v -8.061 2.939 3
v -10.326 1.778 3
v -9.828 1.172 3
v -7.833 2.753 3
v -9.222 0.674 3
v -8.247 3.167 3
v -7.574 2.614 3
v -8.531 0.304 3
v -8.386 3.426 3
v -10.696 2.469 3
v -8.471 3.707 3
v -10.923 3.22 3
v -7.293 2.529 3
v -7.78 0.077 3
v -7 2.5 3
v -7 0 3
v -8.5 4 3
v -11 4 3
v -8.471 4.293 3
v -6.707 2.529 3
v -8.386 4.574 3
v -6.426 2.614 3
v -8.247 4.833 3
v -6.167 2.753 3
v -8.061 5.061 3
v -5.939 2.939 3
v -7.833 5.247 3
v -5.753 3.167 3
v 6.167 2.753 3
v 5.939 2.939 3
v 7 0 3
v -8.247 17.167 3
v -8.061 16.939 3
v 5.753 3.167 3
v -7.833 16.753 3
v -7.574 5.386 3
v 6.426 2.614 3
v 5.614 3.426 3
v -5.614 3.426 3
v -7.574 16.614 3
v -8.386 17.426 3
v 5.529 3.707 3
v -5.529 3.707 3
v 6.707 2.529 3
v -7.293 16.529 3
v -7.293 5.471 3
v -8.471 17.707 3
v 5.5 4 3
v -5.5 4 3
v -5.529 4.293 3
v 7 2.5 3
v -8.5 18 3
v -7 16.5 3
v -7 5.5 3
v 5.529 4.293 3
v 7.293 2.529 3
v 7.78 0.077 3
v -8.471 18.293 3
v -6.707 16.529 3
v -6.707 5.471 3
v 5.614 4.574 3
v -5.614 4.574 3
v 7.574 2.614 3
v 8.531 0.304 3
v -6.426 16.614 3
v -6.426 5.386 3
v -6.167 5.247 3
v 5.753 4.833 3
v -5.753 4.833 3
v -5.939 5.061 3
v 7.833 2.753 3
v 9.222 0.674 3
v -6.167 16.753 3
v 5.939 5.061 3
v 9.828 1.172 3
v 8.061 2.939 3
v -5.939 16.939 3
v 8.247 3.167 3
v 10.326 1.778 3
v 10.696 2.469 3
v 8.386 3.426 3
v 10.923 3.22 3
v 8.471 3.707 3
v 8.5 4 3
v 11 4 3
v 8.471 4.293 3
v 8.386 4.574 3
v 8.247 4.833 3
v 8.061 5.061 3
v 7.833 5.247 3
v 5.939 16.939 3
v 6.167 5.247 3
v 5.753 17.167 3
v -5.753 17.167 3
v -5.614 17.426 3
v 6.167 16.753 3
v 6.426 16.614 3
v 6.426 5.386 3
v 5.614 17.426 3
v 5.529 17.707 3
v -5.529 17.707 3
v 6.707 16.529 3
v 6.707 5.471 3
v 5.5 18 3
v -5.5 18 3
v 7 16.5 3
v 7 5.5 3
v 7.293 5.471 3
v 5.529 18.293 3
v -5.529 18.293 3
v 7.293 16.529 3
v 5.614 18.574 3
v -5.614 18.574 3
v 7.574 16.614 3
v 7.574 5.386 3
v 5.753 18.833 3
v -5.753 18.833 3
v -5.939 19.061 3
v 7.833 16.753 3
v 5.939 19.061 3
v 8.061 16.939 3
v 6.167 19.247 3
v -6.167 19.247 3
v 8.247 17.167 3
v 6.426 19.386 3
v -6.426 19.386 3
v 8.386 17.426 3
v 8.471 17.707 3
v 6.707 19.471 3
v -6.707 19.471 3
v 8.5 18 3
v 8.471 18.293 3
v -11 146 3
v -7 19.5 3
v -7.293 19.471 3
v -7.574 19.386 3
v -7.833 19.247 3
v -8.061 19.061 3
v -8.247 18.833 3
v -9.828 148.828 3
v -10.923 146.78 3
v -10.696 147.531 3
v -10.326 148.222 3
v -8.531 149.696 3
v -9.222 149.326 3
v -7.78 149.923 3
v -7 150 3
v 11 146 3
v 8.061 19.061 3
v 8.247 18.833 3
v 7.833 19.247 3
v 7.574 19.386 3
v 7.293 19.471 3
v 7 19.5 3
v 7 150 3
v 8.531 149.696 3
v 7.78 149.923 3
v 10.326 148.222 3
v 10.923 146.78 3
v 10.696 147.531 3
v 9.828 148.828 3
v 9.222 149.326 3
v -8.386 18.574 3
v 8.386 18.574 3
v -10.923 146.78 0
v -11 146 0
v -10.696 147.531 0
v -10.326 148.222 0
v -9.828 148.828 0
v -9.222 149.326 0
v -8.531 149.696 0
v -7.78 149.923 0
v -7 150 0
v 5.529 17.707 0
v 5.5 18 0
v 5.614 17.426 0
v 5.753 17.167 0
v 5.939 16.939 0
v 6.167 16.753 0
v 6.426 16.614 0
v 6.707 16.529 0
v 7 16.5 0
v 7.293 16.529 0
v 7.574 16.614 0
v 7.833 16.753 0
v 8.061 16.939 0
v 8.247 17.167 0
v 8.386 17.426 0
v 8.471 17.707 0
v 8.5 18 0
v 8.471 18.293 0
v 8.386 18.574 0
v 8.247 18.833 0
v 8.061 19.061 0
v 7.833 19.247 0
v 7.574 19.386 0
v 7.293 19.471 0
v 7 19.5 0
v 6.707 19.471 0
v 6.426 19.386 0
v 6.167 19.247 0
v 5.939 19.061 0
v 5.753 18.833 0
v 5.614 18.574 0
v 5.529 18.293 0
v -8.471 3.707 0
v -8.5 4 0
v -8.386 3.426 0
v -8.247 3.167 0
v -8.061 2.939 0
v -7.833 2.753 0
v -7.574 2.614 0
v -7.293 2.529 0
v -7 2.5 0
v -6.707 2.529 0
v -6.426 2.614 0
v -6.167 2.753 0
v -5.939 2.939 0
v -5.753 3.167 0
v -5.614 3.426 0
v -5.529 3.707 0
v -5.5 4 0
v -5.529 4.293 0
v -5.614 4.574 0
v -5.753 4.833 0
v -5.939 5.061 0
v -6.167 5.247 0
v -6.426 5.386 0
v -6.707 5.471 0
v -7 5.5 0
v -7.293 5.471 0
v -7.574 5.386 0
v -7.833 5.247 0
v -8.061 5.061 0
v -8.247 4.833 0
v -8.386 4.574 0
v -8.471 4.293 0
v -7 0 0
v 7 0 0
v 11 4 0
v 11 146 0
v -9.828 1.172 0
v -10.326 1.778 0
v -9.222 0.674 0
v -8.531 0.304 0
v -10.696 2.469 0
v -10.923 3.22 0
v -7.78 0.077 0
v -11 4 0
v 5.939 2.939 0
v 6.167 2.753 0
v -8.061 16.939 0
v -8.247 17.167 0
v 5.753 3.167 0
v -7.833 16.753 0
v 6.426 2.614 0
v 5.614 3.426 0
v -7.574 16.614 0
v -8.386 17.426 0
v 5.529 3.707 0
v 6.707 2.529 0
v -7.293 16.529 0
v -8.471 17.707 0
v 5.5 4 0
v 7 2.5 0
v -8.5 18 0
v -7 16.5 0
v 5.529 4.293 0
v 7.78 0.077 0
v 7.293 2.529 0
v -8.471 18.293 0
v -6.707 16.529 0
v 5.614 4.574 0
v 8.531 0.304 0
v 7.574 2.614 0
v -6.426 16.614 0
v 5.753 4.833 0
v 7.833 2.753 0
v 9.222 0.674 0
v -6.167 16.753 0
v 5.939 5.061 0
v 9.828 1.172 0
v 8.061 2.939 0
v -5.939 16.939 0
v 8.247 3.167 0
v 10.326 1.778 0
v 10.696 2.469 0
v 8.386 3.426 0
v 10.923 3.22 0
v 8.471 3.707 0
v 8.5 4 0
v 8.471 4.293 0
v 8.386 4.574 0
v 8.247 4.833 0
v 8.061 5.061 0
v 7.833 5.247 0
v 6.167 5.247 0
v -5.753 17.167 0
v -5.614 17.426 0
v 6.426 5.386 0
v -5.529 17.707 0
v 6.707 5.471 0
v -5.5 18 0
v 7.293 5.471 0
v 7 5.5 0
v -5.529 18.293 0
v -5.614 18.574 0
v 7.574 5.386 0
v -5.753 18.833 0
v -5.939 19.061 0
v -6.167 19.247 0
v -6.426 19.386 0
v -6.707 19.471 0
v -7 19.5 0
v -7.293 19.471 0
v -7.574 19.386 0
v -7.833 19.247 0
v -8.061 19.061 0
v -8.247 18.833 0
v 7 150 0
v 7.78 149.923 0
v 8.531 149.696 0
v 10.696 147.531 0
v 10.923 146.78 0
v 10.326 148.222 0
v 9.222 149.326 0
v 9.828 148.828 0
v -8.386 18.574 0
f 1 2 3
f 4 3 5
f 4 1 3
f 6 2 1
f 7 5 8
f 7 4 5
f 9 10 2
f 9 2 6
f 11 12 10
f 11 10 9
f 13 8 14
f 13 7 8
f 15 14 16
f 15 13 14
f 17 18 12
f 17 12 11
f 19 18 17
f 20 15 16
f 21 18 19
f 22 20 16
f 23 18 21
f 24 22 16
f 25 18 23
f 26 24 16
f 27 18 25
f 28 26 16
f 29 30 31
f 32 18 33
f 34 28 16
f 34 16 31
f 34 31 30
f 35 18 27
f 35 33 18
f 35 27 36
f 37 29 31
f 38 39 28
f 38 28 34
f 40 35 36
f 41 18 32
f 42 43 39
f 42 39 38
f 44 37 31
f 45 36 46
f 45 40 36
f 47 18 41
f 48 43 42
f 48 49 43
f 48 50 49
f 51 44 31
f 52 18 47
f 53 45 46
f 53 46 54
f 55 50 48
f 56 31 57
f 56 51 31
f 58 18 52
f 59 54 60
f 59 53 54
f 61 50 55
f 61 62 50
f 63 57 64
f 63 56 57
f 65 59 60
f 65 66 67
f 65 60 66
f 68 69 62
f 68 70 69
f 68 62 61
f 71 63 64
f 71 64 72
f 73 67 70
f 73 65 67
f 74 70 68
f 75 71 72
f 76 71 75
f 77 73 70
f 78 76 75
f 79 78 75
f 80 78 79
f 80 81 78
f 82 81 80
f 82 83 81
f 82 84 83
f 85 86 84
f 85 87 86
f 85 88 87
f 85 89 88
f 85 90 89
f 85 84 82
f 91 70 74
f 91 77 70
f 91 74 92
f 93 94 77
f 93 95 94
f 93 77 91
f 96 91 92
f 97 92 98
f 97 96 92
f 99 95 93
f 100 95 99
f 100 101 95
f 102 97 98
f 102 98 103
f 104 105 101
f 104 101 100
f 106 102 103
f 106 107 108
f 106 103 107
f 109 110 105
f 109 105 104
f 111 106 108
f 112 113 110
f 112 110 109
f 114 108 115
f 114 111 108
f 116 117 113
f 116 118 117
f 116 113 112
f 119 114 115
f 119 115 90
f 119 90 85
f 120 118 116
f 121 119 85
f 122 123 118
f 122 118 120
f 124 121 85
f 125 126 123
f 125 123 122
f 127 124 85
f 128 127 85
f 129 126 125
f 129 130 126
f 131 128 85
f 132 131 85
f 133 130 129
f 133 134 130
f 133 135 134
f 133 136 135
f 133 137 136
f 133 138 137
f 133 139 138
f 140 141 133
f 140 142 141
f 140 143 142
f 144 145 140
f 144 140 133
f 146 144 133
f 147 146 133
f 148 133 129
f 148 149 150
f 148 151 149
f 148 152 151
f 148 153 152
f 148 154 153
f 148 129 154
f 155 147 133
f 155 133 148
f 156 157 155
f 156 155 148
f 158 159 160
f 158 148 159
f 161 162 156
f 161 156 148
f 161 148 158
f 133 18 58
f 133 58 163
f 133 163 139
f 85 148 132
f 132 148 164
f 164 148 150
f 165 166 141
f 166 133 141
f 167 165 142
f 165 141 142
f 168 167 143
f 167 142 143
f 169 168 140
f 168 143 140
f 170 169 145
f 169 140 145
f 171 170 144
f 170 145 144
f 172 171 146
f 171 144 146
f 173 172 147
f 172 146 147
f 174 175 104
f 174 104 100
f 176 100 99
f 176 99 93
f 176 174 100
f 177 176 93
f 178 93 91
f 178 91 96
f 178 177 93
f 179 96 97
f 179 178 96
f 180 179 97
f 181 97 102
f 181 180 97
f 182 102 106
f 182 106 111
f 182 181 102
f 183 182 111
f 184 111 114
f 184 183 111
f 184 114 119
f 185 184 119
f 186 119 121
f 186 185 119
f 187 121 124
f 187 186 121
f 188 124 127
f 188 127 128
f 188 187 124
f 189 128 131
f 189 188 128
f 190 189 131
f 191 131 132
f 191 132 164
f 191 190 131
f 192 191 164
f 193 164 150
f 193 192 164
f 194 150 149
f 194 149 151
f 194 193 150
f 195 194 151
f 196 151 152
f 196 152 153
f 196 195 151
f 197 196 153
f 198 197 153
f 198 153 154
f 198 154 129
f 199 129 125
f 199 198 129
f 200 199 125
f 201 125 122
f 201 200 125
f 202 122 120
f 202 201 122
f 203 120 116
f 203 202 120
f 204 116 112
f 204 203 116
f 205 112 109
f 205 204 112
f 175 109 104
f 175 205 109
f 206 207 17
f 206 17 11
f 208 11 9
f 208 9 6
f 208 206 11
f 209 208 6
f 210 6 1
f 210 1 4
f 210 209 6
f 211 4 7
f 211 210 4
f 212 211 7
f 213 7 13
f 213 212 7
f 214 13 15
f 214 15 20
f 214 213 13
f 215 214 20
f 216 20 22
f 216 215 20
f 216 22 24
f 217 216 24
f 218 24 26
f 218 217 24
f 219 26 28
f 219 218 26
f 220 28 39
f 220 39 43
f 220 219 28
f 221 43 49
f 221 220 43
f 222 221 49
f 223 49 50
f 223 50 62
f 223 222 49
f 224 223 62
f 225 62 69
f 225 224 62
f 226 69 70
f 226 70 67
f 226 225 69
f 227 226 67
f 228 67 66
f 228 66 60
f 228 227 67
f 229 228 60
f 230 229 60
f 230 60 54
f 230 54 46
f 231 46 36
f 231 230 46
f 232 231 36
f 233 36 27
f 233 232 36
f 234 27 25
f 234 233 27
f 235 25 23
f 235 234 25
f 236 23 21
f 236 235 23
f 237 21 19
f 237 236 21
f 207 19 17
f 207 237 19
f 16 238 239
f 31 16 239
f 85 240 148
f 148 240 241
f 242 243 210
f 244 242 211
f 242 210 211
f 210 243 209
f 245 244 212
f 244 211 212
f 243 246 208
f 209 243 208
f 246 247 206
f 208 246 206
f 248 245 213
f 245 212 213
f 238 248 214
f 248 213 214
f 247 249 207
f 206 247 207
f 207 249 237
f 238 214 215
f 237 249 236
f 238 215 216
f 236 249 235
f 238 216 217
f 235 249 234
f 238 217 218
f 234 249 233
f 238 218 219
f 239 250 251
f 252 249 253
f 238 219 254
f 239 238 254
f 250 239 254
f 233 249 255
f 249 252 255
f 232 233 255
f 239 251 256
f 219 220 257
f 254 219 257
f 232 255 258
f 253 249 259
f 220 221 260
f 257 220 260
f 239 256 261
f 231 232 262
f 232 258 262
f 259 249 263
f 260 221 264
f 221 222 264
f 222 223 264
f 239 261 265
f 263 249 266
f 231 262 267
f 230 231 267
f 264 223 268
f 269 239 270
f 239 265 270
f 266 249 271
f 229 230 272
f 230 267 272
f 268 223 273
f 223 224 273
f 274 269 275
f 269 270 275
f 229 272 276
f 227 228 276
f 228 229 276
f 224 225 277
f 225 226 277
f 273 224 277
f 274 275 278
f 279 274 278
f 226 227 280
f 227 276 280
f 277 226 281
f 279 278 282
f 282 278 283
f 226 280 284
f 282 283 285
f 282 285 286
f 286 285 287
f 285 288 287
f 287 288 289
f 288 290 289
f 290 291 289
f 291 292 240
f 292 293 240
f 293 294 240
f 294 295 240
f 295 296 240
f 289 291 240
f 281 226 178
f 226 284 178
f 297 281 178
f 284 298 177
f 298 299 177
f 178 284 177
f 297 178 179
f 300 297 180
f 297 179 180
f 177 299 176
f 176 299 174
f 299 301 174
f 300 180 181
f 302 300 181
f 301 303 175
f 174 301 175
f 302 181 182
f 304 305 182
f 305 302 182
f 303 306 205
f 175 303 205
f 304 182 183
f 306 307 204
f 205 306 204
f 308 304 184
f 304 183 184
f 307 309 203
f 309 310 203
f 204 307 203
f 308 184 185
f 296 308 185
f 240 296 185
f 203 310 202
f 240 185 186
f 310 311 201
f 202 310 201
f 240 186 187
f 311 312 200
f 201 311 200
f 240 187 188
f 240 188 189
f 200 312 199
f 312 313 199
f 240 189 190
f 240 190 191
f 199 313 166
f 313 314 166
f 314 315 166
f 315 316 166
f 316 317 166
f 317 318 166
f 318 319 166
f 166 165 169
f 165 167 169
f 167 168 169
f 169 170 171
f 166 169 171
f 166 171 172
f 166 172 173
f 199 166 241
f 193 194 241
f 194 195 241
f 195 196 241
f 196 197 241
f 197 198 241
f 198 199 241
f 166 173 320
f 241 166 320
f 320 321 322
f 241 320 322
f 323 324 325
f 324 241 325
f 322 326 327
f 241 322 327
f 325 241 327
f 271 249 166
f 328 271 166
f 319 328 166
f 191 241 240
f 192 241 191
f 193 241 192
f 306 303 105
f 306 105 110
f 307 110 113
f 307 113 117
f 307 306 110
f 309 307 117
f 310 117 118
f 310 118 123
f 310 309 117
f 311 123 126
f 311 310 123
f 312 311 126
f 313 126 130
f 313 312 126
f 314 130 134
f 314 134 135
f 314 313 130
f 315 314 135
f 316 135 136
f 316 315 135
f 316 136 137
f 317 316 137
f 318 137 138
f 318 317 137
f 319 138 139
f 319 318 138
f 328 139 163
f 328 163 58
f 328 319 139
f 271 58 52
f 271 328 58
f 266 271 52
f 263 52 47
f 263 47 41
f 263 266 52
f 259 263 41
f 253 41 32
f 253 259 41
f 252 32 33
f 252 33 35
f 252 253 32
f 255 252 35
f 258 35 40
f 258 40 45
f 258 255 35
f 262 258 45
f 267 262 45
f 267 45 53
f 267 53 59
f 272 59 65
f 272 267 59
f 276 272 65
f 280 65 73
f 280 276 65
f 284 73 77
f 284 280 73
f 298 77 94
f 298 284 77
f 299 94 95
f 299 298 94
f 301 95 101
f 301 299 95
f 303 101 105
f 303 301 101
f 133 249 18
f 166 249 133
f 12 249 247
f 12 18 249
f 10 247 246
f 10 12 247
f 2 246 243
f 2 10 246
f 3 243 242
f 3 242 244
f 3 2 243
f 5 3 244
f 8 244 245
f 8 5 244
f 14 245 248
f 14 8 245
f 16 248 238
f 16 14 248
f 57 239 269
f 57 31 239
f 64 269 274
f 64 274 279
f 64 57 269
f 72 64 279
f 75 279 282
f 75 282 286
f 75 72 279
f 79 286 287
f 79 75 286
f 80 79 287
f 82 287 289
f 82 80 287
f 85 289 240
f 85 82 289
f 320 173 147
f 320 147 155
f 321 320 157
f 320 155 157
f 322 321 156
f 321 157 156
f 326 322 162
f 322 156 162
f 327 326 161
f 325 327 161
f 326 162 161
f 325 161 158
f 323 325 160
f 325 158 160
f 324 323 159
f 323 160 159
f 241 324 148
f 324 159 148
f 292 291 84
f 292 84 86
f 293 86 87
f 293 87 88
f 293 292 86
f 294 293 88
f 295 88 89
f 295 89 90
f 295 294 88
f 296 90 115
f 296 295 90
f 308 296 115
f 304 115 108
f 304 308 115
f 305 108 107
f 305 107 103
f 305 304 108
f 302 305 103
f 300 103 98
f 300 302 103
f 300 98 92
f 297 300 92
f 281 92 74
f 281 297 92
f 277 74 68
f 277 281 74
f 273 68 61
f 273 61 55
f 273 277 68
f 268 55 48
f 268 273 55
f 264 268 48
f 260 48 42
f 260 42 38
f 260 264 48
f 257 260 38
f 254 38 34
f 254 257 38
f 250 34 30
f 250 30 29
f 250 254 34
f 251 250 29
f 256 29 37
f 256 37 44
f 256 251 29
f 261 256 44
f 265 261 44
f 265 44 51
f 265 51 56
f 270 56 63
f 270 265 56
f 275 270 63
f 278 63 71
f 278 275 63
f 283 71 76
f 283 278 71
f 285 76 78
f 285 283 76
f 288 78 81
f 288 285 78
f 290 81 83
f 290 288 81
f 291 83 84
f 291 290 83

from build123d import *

# Parameters (mm, degrees)
ESQUISSE1_W        = 22
ESQUISSE1_H        = 150
ESQUISSE1_R        = 1.5
BOSS_EXTRU_1_DEPTH = 3
CONG_1_R           = 4


with BuildPart() as part:
    # Esquisse1 → Boss.-Extru.1 (new body)
    with BuildSketch(Plane.XY):
        with Locations((0, 75)):
            Rectangle(ESQUISSE1_W, ESQUISSE1_H)
        with Locations((7, 4)):
            Circle(ESQUISSE1_R, mode=Mode.SUBTRACT)
        with Locations(Location((-7, 4, 0), (0, 0, 180))):
            Circle(ESQUISSE1_R, mode=Mode.SUBTRACT)
        with Locations(Location((7, 18, 0), (0, 0, 180))):
            Circle(ESQUISSE1_R, mode=Mode.SUBTRACT)
        with Locations((-7, 18)):
            Circle(ESQUISSE1_R, mode=Mode.SUBTRACT)
    extrude(amount=BOSS_EXTRU_1_DEPTH)

    # Congé1
    cong_1_edges = [part.edges().sort_by_distance(p)[0] for p in [
        (-11, 150, 1.5),
        (11, 150, 1.5),
        (11, 0, 1.5),
        (-11, 0, 1.5),
    ]]
    fillet(cong_1_edges, radius=CONG_1_R)


solid = part.part
